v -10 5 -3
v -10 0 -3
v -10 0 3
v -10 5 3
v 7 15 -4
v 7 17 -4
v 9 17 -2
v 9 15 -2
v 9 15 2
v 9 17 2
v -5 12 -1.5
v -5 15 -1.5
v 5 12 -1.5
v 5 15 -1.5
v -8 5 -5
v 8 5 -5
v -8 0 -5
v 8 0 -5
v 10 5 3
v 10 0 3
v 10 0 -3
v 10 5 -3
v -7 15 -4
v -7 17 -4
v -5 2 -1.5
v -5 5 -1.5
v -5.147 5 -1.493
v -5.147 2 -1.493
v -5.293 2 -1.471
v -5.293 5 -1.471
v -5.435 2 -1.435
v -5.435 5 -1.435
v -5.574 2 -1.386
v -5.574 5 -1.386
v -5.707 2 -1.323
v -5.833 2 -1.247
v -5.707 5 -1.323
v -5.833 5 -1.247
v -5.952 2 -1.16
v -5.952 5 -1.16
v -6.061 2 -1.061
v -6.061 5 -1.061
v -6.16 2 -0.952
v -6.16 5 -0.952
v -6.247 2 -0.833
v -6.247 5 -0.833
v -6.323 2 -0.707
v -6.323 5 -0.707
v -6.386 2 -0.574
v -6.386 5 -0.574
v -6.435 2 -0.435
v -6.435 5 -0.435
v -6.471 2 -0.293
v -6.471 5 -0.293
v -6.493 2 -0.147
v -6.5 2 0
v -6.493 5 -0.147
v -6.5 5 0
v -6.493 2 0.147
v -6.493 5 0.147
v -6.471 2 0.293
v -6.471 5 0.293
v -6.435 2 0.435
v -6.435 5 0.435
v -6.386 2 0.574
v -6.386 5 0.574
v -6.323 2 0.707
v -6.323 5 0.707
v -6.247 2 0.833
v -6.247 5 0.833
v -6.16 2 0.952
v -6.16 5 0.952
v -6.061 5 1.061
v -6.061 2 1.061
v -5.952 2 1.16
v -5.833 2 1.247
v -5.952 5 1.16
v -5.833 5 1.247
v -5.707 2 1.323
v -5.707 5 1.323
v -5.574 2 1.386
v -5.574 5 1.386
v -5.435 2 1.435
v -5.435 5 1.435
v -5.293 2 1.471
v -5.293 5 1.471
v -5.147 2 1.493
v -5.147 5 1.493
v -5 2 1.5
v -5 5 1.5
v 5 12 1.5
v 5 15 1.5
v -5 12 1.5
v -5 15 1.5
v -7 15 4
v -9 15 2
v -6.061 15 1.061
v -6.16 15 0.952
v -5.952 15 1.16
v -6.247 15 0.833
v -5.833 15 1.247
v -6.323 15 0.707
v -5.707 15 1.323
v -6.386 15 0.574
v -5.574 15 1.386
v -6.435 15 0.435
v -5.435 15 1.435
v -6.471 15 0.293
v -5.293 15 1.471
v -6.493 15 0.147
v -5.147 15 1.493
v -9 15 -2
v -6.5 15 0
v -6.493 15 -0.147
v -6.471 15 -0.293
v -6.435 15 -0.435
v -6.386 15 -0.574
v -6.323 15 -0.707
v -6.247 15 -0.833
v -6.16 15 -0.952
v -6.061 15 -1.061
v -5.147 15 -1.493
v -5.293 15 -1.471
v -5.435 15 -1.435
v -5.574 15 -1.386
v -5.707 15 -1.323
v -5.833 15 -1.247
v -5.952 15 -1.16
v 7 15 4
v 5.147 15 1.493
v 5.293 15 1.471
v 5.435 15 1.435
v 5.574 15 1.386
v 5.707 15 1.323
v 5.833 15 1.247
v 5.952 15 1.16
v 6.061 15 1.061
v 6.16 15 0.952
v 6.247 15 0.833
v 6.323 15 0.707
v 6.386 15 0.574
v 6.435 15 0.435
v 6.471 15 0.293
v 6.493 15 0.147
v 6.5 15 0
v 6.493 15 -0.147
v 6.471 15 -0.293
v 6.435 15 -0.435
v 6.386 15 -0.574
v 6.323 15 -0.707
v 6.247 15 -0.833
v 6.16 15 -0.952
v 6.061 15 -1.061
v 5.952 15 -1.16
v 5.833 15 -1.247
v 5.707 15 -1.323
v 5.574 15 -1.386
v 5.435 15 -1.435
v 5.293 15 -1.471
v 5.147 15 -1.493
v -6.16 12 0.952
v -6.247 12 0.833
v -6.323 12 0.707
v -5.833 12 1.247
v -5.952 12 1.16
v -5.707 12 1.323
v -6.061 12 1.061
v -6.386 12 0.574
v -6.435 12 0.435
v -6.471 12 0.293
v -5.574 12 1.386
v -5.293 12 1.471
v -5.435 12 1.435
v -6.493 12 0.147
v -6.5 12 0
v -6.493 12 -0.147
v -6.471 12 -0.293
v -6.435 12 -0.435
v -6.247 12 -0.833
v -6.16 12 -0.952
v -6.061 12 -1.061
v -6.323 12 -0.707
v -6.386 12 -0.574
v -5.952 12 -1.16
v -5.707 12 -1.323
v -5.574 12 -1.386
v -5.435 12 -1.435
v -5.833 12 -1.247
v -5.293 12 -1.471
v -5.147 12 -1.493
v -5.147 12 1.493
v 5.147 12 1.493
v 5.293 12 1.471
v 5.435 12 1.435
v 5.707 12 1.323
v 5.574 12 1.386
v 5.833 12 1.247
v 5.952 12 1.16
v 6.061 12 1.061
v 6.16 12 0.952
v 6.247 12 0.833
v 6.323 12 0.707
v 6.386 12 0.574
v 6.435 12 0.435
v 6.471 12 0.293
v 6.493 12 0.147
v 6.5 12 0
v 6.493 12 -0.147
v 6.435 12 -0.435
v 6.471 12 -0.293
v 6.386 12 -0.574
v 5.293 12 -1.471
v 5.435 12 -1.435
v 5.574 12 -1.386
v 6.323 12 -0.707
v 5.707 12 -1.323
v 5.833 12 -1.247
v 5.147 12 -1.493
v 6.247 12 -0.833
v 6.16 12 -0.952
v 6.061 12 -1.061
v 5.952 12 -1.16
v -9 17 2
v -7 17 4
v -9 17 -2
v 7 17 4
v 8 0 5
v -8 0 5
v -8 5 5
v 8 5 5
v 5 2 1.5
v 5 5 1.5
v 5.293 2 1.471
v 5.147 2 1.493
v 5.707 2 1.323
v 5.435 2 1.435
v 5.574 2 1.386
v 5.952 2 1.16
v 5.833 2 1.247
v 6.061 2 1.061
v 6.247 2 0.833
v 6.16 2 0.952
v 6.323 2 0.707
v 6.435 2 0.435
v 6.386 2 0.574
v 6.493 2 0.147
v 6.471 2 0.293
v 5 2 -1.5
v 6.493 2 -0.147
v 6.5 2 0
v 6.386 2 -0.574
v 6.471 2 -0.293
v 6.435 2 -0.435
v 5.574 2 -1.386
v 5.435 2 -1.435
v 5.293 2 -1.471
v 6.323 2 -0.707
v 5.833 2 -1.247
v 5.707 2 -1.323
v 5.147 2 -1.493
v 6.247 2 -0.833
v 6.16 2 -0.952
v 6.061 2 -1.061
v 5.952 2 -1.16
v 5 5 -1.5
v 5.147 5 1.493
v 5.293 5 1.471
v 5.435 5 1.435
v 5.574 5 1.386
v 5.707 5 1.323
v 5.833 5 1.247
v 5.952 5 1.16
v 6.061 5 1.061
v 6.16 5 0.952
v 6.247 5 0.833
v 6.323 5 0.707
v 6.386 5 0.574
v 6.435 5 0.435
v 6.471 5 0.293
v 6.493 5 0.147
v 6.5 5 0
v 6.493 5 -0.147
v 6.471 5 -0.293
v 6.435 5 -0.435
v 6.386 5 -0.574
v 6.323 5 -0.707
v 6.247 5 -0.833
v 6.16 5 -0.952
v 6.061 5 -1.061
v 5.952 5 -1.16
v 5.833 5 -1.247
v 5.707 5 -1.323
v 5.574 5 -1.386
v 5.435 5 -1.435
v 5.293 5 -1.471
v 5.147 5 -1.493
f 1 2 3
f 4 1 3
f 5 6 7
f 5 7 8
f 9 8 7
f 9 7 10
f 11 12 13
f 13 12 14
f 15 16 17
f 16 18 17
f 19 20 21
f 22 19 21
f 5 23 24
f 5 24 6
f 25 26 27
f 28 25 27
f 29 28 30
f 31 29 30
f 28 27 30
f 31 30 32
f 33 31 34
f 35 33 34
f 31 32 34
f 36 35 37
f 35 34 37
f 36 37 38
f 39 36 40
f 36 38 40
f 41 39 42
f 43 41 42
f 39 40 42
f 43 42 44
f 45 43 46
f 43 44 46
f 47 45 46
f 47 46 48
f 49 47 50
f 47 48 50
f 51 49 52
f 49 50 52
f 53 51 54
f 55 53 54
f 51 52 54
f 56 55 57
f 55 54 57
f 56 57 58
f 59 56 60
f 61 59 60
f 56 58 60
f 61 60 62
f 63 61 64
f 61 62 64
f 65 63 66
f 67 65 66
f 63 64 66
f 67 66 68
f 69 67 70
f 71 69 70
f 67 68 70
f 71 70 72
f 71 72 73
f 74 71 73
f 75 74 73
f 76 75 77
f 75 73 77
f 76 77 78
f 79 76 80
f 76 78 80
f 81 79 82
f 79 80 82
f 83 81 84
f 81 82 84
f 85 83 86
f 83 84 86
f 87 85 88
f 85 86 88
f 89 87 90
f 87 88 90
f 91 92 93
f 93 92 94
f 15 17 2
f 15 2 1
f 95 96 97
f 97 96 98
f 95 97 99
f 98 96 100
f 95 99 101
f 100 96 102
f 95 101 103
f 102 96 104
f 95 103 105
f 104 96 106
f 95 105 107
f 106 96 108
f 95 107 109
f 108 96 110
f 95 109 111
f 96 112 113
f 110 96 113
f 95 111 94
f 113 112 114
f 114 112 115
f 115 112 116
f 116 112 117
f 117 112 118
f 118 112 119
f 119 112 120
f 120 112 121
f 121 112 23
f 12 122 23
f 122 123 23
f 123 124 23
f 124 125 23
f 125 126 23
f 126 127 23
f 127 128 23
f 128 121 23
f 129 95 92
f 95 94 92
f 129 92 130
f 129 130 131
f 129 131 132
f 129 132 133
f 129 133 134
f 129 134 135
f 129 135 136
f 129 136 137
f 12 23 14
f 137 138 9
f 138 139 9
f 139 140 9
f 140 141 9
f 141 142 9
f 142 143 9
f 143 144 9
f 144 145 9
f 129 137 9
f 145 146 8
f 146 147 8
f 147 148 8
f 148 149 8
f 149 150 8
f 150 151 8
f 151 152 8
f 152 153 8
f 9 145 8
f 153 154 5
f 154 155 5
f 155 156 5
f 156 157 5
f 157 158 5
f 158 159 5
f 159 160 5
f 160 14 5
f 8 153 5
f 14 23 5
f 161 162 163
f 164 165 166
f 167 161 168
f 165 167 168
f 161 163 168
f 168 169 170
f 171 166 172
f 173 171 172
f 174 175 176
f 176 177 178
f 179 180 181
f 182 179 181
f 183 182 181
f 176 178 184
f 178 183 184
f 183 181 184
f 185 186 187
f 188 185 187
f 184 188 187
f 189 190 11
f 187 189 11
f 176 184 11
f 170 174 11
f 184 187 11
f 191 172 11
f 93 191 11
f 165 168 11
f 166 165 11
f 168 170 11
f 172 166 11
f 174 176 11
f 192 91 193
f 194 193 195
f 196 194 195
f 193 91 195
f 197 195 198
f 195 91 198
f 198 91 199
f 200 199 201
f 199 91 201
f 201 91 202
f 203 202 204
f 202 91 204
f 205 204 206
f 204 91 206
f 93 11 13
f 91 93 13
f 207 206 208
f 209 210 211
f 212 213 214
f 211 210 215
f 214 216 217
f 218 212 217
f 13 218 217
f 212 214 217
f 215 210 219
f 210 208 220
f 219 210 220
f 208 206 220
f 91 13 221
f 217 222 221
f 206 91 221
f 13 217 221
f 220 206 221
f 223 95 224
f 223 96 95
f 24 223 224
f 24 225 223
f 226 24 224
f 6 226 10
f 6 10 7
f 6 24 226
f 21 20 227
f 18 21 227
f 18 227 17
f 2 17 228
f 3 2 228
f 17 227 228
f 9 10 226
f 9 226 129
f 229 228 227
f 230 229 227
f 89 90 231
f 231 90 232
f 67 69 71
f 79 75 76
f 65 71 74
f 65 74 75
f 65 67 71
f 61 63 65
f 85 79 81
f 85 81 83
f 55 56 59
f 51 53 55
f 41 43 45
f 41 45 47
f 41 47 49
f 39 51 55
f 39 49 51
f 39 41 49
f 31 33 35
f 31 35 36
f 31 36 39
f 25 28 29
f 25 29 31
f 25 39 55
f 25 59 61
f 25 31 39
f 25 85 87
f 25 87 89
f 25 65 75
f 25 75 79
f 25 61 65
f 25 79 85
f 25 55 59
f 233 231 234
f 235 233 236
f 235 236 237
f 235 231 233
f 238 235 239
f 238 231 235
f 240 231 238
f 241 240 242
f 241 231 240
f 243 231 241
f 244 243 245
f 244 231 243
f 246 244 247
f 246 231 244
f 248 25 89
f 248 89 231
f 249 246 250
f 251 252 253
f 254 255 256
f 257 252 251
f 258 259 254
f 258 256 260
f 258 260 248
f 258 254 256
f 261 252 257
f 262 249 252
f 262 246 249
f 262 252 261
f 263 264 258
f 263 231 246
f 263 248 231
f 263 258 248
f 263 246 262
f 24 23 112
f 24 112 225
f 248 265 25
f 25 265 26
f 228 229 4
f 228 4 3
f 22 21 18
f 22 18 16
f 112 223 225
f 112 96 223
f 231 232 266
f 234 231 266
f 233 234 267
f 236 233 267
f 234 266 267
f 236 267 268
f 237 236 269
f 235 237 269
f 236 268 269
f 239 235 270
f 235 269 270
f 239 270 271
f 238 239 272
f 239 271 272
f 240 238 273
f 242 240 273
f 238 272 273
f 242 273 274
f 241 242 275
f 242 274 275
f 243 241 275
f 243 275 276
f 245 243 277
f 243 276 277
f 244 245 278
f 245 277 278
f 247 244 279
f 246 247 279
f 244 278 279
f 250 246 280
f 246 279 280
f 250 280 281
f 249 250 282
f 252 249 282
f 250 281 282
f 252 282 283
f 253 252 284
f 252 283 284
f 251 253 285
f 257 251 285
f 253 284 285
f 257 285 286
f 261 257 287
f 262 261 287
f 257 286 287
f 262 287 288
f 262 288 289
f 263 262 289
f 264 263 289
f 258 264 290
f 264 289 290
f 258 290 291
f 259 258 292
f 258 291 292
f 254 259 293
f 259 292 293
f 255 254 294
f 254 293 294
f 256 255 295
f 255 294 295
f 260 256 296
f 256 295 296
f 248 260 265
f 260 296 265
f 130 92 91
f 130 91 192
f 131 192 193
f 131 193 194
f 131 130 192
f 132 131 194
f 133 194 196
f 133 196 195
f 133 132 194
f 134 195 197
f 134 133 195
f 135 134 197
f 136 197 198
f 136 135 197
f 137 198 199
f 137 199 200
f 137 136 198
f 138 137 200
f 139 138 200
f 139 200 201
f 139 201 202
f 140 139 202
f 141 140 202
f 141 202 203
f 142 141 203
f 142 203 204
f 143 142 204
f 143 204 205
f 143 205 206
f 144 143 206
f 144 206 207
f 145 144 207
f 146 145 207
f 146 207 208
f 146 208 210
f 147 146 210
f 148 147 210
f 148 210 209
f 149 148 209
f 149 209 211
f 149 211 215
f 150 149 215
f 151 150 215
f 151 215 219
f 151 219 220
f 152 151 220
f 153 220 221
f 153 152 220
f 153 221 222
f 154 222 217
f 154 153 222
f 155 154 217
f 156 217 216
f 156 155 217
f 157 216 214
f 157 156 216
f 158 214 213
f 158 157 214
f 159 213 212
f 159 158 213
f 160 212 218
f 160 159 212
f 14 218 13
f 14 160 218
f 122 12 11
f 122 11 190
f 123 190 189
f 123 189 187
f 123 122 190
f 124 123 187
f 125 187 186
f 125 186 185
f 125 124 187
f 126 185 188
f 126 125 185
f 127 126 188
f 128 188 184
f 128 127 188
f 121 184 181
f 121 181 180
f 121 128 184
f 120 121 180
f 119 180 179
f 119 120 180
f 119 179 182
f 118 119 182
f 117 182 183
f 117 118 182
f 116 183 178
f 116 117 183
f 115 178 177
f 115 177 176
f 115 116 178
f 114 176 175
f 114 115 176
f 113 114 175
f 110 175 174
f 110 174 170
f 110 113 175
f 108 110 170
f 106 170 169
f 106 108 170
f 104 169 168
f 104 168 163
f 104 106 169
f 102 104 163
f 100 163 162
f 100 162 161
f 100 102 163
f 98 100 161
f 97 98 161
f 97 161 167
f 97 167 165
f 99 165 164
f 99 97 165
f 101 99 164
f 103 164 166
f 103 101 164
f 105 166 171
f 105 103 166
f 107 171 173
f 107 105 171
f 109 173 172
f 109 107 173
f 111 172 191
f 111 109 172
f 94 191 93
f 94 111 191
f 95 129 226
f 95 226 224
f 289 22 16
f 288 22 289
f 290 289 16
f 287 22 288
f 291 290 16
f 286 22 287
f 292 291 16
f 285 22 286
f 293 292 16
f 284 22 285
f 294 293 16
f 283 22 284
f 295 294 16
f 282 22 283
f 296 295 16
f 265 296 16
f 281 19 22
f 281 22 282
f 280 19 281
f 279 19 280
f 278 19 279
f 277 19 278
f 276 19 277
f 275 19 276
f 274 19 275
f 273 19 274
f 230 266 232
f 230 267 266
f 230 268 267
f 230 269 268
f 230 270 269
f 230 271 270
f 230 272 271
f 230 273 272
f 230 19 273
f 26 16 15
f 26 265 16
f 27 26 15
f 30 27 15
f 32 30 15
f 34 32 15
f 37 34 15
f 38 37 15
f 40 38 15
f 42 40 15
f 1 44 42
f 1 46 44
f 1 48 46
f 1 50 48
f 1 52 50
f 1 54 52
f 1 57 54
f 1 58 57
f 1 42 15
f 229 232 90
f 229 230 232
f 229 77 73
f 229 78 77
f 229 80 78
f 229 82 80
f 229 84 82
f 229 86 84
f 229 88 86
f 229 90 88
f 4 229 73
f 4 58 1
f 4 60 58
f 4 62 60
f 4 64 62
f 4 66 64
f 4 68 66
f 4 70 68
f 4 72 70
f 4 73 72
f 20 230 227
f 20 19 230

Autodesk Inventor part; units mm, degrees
ref_plane "YZ Plane" through (0, 0, 0) normal (1, 0, 0) x (0, 1, 0)
ref_plane "XZ Plane" through (0, 0, 0) normal (0, 1, 0) x (-1, 0, 0)
ref_plane "XY Plane" through (0, 0, 0) normal (0, 0, 1) x (1, 0, 0)
sketch "Sketch1" plane through (0, 0, 0) normal (0, 1, 0) x (-1, 0, 0)
  line L0 (10, 5) -> (-10, 5)
  line L1 (-10, 5) -> (-10, -5)
  line L2 (-10, -5) -> (10, -5)
  line L3 (10, -5) -> (10, 5)
  line L4 (10, 5) -> (-10, -5) construction
  line L5 (-10, 5) -> (10, -5) construction
  point P0 (0, 0)
  dimension "d0" = 20
  dimension "d1" = 10
extrude "Extrusion1" add sketch "Sketch1" along normal blind 5
sketch "Sketch2" plane through (0, 5, 0) normal (0, 1, 0) x (1, 0, 0)
  line L0 (-5, 0) -> (5, 0) construction
  line L1 (-5, -1.5) -> (5, -1.5)
  line L2 (5, 1.5) -> (-5, 1.5)
  arc A0 (-5, 1.5) -> (-5, -1.5) centre (-5, 0) ccw
  arc A1 (5, -1.5) -> (5, 1.5) centre (5, 0) ccw
  point P0 (0, 0)
  dimension "d4" = 5
  dimension "d5" = 3
extrude "Extrusion2" cut sketch "Sketch2" against normal blind 3
ref_plane "Work Plane1" through (0, 15, 0) normal (0, 1, 0) x (1, 0, 0)
sketch "Sketch3" plane through (0, 15, 0) normal (0, 1, 0) x (1, 0, 0)
  line L0 (-10, -5) -> (10, -5) projected
  line L1 (10, -5) -> (10, 5) projected
  line L2 (10, 5) -> (-10, 5) projected
  line L3 (-10, 5) -> (-10, -5) projected
  line L4 (5, -1.5) -> (-5, -1.5) projected
  arc A0 (5, -1.5) -> (5, 1.5) centre (5, 0) ccw projected
  line L5 (-5, 1.5) -> (5, 1.5) projected
  arc A1 (-5, 1.5) -> (-5, -1.5) centre (-5, 0) ccw projected
  point P0 (0, 0)
extrude "Extrusion3" add sketch "Sketch3" against normal blind 3 contours L4 A1 L5 A0
sketch "Sketch4" plane through (0, 15, 0) normal (0, 1, 0) x (1, 0, 0)
  line L0 (9, -4) -> (-9, -4)
  line L1 (-9, -4) -> (-9, 4)
  line L2 (-9, 4) -> (9, 4)
  line L3 (9, 4) -> (9, -4)
  line L4 (9, -4) -> (-9, 4) construction
  line L5 (-9, -4) -> (9, 4) construction
  point P0 (0, 0)
  dimension "d12" = 18
  dimension "d13" = 8
chamfer "Chamfer1" distance 2 angle 45 4 edges at (-10, 2.5, -5) (-10, 2.5, 5) (10, 2.5, -5) (10, 2.5, 5)
extrude "Extrusion4" add sketch "Sketch4" along normal blind 2
chamfer "Chamfer2" distance 2 angle 45 4 edges at (-9, 16, -4) (-9, 16, 4) (9, 16, 4) (9, 16, -4)
ref_plane "Work Plane2" through (0, 10, 0) normal (0, 1, 0) x (1, 0, 0)
split body "Split1" result two bodies by plane through (0, 10, 0) normal (0, 1, 0) first body at (-2.3333, 16.5, 1.3333)
properties part number "test_slot"
